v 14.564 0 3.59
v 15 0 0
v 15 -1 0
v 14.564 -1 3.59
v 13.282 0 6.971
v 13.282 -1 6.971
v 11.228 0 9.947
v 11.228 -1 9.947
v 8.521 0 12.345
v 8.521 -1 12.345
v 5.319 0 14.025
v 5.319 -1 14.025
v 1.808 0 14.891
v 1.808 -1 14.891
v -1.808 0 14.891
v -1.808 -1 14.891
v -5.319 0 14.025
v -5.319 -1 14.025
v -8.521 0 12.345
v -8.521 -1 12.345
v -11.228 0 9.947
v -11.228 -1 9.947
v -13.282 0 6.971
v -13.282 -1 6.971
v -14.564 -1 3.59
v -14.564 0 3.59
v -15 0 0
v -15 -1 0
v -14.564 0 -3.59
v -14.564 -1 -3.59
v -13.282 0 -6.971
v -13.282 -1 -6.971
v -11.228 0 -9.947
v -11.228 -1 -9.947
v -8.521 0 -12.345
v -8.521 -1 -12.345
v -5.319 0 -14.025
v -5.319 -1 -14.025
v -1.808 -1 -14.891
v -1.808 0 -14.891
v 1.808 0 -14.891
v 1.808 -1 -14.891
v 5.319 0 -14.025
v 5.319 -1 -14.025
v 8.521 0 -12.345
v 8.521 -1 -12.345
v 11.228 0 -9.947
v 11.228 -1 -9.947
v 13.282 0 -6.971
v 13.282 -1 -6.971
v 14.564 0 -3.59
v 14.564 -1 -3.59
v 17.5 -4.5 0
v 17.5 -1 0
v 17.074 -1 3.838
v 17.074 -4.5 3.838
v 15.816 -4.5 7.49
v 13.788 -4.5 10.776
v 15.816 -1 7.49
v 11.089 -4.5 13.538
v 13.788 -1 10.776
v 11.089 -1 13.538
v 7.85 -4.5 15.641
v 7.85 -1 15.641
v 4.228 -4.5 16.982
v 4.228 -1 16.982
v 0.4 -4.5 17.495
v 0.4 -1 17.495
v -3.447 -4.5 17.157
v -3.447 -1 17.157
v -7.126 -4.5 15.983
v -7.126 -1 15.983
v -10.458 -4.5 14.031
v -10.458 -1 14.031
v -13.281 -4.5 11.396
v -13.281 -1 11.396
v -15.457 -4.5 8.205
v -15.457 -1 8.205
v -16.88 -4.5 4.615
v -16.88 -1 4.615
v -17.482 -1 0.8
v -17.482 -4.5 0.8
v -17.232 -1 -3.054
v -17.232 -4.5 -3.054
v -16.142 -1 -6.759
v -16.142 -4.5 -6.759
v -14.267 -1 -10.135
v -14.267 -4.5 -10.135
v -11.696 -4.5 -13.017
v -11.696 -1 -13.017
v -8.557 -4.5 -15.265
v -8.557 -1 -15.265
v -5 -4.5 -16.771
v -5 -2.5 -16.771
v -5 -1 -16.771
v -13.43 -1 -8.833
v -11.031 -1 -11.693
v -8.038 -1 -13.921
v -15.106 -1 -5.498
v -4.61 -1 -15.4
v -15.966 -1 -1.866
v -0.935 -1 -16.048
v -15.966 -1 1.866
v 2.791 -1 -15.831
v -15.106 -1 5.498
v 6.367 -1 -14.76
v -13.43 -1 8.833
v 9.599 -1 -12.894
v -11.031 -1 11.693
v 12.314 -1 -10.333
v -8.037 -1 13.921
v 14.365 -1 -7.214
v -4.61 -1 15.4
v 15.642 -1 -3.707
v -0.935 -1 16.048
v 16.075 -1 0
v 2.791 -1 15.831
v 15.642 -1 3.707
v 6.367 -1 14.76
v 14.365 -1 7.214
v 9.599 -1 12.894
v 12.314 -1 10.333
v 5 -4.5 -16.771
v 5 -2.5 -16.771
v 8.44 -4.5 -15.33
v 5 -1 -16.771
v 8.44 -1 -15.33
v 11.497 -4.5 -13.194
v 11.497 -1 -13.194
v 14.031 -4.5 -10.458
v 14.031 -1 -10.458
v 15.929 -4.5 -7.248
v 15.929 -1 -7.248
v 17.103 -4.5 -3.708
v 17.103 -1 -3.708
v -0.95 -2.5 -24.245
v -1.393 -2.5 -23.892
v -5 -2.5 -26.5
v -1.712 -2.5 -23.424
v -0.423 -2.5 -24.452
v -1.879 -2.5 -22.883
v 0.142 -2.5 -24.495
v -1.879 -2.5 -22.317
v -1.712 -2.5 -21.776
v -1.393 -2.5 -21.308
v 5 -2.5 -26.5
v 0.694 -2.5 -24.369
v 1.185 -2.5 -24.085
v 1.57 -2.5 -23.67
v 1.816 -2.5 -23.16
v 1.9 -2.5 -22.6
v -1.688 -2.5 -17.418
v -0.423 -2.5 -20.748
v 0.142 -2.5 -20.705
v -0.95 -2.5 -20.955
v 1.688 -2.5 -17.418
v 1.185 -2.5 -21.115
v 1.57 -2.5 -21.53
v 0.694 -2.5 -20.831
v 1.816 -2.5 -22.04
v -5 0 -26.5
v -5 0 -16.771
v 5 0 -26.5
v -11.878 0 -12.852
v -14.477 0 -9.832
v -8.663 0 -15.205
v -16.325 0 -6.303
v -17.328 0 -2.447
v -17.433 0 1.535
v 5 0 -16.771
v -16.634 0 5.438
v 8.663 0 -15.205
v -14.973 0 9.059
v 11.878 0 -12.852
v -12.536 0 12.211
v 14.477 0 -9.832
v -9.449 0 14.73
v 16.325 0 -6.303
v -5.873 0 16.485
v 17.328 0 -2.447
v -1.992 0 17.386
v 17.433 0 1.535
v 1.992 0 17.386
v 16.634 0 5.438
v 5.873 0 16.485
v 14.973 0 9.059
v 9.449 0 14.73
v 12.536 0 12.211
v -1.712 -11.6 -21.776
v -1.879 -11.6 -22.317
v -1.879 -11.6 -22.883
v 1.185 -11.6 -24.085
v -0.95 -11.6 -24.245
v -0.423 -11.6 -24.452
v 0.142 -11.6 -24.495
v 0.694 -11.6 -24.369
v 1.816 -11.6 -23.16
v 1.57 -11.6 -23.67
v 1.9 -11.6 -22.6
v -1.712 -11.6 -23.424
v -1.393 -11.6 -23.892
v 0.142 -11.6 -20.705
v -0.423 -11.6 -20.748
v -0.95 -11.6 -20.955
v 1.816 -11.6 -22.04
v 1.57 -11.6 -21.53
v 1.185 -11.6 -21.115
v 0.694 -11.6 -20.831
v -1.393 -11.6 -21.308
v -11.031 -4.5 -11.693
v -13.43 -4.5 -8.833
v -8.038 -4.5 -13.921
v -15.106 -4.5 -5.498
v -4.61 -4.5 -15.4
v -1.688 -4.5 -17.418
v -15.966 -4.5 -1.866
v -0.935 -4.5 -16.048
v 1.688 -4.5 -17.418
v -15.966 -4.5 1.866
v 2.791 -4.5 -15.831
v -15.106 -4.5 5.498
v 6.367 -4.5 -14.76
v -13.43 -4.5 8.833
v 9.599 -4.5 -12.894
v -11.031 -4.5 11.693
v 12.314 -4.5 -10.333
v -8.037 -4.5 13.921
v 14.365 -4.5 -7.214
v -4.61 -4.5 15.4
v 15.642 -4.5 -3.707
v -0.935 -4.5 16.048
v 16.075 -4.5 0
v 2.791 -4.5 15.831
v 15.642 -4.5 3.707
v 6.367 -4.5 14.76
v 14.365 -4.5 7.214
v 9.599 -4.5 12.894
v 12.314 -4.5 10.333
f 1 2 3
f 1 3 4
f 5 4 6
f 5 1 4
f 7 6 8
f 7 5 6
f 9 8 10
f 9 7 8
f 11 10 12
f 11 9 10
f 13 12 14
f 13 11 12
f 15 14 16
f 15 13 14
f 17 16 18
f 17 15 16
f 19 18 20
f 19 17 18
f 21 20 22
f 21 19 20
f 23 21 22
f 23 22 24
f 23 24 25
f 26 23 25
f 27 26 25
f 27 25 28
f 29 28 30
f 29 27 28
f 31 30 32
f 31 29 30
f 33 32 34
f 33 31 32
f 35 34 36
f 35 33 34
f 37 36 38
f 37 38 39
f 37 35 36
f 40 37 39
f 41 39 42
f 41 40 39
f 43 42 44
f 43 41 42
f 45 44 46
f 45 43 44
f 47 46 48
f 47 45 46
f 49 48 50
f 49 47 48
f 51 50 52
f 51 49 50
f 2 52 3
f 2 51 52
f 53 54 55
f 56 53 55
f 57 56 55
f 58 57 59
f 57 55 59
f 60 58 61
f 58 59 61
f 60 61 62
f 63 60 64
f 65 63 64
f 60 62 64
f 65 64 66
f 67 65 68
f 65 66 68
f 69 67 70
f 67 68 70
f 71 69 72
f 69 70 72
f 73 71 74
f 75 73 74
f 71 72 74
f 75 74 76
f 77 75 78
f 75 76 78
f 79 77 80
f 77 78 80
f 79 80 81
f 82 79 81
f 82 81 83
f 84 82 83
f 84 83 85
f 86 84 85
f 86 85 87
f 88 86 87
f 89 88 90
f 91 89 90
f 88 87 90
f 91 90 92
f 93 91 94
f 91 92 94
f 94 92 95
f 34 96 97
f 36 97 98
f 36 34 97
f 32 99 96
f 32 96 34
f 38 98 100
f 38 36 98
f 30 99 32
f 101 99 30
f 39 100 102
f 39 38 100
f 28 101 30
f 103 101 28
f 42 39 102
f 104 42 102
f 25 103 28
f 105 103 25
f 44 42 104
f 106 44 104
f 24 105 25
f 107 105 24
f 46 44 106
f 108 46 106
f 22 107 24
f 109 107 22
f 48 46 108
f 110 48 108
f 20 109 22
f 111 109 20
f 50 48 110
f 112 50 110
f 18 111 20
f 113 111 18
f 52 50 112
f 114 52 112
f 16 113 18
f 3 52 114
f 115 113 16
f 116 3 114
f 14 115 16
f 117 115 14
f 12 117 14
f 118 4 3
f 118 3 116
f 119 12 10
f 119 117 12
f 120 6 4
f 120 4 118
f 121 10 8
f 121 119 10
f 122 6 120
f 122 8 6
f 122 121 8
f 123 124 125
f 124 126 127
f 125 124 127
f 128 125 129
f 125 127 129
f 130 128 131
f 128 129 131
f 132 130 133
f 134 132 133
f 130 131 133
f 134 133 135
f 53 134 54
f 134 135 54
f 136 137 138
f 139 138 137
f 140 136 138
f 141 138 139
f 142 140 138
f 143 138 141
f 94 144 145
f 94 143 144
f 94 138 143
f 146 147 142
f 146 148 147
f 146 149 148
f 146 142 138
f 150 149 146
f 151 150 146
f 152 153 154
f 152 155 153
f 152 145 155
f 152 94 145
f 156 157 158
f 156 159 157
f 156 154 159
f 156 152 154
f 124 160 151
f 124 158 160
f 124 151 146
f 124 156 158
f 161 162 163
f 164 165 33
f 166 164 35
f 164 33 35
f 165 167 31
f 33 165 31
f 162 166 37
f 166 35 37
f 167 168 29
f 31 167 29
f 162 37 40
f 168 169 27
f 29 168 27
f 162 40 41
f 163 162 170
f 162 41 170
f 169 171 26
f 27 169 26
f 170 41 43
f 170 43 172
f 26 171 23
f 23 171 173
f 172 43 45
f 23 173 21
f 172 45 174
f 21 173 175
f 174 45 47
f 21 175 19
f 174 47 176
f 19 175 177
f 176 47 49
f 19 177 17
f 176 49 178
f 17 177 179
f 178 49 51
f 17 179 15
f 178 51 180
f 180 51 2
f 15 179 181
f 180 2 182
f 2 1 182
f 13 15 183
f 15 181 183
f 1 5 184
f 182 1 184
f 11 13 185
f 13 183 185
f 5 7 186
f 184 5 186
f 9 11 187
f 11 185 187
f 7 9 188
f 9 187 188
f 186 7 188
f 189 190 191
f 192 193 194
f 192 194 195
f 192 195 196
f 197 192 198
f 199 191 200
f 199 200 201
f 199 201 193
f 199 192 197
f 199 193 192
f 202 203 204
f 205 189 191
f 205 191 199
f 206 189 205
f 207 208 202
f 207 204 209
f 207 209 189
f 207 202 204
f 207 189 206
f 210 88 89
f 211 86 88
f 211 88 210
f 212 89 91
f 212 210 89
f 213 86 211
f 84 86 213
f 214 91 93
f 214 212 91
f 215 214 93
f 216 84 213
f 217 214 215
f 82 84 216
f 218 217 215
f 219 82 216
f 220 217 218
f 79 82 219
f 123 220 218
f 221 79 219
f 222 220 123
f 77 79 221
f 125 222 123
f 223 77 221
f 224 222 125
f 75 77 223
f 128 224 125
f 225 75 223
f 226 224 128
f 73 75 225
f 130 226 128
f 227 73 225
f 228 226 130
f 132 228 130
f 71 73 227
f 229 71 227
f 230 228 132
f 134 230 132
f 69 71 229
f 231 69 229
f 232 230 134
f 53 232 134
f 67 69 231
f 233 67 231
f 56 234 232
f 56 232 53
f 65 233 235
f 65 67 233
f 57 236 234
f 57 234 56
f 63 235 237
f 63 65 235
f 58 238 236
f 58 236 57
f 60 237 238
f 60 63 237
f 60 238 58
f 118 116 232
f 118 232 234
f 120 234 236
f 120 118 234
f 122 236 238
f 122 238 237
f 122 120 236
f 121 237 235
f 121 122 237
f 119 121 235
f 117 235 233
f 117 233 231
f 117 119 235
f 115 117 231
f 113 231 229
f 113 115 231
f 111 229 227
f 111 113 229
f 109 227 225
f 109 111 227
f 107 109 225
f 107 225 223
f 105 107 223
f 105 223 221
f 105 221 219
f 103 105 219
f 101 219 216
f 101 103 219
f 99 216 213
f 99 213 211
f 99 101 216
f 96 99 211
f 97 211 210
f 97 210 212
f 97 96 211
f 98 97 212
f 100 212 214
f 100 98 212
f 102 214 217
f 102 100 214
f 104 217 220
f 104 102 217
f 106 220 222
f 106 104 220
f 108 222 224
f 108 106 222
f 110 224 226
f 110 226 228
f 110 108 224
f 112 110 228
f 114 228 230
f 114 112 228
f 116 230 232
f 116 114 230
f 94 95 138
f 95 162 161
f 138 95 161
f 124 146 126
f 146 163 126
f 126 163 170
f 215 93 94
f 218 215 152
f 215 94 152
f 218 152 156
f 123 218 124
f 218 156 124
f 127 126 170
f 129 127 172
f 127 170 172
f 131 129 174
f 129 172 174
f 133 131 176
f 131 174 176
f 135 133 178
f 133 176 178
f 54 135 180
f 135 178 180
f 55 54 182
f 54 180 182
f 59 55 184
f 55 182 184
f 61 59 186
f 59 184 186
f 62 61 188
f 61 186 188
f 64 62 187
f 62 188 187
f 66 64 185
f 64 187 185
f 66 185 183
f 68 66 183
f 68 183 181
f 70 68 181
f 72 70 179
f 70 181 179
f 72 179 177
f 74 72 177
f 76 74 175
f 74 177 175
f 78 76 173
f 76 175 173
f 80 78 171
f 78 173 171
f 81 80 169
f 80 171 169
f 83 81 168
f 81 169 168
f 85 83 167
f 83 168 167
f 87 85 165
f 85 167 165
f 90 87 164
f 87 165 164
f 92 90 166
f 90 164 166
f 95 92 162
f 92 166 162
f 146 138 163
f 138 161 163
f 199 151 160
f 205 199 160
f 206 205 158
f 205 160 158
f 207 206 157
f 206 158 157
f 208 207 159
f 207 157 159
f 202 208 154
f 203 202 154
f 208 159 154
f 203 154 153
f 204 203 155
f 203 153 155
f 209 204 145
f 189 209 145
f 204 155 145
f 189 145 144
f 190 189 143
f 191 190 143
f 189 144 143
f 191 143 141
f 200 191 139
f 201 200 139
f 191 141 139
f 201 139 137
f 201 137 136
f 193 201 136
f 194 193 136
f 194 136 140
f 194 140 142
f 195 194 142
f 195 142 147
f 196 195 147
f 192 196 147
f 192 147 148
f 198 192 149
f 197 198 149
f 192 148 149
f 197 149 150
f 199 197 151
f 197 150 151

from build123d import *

# Parameters (mm, degrees)
F0_R     = 15
F1_DEPTH = 1
F2_R     = 16.075
F3_DEPTH = 3.5
F4_DEPTH = 1.5
F5_R     = 1.9
F6_DEPTH = 9.1


with BuildPart() as f1:
    # F0 (on Front) → F1 (new body)
    with BuildSketch(Plane.XZ):
        with BuildLine():
            Line((5, -26.5), (5, -16.77051))
            ThreePointArc((5, -16.77051), (0, 17.5), (-5, -16.77051))
            Line((-5, -16.77051), (-5, -26.5))
            Line((-5, -26.5), (5, -26.5))
        make_face()
        Circle(F0_R, mode=Mode.SUBTRACT)
    extrude(amount=F1_DEPTH)

    # F2 (on face) → F3 (join)
    with BuildSketch(Plane.XZ.offset(1)):
        with BuildLine():
            ThreePointArc((5, -16.77051), (14.031215, -10.45825), (17.5, 0))
            ThreePointArc((17.5, 0), (-10.45825, 14.031215), (-5, -16.77051))
            ThreePointArc((-5, -16.77051), (0, -17.5), (5, -16.77051))
        make_face()
        Circle(F2_R, mode=Mode.SUBTRACT)
    extrude(amount=F3_DEPTH)

    # F3_face (on face) → F4 (join)
    with BuildSketch(Plane(origin=(0, -1, -21.876907), x_dir=(1, 0, 0), z_dir=(0, -1, 0))):
        with BuildLine():
            ThreePointArc((5, 5.106397), (0, 4.376907), (-5, 5.106397))
            Line((-5, 5.106397), (-5, -4.623093))
            Line((-5, -4.623093), (5, -4.623093))
            Line((5, -4.623093), (5, 5.106397))
        make_face()
    extrude(amount=F4_DEPTH)

    # F5 (on face) → F6 (join)
    with BuildSketch(Plane.XZ.offset(2.5)):
        with Locations((0, -22.6)):
            Circle(F5_R)
    extrude(amount=F6_DEPTH)


solid = f1.part
